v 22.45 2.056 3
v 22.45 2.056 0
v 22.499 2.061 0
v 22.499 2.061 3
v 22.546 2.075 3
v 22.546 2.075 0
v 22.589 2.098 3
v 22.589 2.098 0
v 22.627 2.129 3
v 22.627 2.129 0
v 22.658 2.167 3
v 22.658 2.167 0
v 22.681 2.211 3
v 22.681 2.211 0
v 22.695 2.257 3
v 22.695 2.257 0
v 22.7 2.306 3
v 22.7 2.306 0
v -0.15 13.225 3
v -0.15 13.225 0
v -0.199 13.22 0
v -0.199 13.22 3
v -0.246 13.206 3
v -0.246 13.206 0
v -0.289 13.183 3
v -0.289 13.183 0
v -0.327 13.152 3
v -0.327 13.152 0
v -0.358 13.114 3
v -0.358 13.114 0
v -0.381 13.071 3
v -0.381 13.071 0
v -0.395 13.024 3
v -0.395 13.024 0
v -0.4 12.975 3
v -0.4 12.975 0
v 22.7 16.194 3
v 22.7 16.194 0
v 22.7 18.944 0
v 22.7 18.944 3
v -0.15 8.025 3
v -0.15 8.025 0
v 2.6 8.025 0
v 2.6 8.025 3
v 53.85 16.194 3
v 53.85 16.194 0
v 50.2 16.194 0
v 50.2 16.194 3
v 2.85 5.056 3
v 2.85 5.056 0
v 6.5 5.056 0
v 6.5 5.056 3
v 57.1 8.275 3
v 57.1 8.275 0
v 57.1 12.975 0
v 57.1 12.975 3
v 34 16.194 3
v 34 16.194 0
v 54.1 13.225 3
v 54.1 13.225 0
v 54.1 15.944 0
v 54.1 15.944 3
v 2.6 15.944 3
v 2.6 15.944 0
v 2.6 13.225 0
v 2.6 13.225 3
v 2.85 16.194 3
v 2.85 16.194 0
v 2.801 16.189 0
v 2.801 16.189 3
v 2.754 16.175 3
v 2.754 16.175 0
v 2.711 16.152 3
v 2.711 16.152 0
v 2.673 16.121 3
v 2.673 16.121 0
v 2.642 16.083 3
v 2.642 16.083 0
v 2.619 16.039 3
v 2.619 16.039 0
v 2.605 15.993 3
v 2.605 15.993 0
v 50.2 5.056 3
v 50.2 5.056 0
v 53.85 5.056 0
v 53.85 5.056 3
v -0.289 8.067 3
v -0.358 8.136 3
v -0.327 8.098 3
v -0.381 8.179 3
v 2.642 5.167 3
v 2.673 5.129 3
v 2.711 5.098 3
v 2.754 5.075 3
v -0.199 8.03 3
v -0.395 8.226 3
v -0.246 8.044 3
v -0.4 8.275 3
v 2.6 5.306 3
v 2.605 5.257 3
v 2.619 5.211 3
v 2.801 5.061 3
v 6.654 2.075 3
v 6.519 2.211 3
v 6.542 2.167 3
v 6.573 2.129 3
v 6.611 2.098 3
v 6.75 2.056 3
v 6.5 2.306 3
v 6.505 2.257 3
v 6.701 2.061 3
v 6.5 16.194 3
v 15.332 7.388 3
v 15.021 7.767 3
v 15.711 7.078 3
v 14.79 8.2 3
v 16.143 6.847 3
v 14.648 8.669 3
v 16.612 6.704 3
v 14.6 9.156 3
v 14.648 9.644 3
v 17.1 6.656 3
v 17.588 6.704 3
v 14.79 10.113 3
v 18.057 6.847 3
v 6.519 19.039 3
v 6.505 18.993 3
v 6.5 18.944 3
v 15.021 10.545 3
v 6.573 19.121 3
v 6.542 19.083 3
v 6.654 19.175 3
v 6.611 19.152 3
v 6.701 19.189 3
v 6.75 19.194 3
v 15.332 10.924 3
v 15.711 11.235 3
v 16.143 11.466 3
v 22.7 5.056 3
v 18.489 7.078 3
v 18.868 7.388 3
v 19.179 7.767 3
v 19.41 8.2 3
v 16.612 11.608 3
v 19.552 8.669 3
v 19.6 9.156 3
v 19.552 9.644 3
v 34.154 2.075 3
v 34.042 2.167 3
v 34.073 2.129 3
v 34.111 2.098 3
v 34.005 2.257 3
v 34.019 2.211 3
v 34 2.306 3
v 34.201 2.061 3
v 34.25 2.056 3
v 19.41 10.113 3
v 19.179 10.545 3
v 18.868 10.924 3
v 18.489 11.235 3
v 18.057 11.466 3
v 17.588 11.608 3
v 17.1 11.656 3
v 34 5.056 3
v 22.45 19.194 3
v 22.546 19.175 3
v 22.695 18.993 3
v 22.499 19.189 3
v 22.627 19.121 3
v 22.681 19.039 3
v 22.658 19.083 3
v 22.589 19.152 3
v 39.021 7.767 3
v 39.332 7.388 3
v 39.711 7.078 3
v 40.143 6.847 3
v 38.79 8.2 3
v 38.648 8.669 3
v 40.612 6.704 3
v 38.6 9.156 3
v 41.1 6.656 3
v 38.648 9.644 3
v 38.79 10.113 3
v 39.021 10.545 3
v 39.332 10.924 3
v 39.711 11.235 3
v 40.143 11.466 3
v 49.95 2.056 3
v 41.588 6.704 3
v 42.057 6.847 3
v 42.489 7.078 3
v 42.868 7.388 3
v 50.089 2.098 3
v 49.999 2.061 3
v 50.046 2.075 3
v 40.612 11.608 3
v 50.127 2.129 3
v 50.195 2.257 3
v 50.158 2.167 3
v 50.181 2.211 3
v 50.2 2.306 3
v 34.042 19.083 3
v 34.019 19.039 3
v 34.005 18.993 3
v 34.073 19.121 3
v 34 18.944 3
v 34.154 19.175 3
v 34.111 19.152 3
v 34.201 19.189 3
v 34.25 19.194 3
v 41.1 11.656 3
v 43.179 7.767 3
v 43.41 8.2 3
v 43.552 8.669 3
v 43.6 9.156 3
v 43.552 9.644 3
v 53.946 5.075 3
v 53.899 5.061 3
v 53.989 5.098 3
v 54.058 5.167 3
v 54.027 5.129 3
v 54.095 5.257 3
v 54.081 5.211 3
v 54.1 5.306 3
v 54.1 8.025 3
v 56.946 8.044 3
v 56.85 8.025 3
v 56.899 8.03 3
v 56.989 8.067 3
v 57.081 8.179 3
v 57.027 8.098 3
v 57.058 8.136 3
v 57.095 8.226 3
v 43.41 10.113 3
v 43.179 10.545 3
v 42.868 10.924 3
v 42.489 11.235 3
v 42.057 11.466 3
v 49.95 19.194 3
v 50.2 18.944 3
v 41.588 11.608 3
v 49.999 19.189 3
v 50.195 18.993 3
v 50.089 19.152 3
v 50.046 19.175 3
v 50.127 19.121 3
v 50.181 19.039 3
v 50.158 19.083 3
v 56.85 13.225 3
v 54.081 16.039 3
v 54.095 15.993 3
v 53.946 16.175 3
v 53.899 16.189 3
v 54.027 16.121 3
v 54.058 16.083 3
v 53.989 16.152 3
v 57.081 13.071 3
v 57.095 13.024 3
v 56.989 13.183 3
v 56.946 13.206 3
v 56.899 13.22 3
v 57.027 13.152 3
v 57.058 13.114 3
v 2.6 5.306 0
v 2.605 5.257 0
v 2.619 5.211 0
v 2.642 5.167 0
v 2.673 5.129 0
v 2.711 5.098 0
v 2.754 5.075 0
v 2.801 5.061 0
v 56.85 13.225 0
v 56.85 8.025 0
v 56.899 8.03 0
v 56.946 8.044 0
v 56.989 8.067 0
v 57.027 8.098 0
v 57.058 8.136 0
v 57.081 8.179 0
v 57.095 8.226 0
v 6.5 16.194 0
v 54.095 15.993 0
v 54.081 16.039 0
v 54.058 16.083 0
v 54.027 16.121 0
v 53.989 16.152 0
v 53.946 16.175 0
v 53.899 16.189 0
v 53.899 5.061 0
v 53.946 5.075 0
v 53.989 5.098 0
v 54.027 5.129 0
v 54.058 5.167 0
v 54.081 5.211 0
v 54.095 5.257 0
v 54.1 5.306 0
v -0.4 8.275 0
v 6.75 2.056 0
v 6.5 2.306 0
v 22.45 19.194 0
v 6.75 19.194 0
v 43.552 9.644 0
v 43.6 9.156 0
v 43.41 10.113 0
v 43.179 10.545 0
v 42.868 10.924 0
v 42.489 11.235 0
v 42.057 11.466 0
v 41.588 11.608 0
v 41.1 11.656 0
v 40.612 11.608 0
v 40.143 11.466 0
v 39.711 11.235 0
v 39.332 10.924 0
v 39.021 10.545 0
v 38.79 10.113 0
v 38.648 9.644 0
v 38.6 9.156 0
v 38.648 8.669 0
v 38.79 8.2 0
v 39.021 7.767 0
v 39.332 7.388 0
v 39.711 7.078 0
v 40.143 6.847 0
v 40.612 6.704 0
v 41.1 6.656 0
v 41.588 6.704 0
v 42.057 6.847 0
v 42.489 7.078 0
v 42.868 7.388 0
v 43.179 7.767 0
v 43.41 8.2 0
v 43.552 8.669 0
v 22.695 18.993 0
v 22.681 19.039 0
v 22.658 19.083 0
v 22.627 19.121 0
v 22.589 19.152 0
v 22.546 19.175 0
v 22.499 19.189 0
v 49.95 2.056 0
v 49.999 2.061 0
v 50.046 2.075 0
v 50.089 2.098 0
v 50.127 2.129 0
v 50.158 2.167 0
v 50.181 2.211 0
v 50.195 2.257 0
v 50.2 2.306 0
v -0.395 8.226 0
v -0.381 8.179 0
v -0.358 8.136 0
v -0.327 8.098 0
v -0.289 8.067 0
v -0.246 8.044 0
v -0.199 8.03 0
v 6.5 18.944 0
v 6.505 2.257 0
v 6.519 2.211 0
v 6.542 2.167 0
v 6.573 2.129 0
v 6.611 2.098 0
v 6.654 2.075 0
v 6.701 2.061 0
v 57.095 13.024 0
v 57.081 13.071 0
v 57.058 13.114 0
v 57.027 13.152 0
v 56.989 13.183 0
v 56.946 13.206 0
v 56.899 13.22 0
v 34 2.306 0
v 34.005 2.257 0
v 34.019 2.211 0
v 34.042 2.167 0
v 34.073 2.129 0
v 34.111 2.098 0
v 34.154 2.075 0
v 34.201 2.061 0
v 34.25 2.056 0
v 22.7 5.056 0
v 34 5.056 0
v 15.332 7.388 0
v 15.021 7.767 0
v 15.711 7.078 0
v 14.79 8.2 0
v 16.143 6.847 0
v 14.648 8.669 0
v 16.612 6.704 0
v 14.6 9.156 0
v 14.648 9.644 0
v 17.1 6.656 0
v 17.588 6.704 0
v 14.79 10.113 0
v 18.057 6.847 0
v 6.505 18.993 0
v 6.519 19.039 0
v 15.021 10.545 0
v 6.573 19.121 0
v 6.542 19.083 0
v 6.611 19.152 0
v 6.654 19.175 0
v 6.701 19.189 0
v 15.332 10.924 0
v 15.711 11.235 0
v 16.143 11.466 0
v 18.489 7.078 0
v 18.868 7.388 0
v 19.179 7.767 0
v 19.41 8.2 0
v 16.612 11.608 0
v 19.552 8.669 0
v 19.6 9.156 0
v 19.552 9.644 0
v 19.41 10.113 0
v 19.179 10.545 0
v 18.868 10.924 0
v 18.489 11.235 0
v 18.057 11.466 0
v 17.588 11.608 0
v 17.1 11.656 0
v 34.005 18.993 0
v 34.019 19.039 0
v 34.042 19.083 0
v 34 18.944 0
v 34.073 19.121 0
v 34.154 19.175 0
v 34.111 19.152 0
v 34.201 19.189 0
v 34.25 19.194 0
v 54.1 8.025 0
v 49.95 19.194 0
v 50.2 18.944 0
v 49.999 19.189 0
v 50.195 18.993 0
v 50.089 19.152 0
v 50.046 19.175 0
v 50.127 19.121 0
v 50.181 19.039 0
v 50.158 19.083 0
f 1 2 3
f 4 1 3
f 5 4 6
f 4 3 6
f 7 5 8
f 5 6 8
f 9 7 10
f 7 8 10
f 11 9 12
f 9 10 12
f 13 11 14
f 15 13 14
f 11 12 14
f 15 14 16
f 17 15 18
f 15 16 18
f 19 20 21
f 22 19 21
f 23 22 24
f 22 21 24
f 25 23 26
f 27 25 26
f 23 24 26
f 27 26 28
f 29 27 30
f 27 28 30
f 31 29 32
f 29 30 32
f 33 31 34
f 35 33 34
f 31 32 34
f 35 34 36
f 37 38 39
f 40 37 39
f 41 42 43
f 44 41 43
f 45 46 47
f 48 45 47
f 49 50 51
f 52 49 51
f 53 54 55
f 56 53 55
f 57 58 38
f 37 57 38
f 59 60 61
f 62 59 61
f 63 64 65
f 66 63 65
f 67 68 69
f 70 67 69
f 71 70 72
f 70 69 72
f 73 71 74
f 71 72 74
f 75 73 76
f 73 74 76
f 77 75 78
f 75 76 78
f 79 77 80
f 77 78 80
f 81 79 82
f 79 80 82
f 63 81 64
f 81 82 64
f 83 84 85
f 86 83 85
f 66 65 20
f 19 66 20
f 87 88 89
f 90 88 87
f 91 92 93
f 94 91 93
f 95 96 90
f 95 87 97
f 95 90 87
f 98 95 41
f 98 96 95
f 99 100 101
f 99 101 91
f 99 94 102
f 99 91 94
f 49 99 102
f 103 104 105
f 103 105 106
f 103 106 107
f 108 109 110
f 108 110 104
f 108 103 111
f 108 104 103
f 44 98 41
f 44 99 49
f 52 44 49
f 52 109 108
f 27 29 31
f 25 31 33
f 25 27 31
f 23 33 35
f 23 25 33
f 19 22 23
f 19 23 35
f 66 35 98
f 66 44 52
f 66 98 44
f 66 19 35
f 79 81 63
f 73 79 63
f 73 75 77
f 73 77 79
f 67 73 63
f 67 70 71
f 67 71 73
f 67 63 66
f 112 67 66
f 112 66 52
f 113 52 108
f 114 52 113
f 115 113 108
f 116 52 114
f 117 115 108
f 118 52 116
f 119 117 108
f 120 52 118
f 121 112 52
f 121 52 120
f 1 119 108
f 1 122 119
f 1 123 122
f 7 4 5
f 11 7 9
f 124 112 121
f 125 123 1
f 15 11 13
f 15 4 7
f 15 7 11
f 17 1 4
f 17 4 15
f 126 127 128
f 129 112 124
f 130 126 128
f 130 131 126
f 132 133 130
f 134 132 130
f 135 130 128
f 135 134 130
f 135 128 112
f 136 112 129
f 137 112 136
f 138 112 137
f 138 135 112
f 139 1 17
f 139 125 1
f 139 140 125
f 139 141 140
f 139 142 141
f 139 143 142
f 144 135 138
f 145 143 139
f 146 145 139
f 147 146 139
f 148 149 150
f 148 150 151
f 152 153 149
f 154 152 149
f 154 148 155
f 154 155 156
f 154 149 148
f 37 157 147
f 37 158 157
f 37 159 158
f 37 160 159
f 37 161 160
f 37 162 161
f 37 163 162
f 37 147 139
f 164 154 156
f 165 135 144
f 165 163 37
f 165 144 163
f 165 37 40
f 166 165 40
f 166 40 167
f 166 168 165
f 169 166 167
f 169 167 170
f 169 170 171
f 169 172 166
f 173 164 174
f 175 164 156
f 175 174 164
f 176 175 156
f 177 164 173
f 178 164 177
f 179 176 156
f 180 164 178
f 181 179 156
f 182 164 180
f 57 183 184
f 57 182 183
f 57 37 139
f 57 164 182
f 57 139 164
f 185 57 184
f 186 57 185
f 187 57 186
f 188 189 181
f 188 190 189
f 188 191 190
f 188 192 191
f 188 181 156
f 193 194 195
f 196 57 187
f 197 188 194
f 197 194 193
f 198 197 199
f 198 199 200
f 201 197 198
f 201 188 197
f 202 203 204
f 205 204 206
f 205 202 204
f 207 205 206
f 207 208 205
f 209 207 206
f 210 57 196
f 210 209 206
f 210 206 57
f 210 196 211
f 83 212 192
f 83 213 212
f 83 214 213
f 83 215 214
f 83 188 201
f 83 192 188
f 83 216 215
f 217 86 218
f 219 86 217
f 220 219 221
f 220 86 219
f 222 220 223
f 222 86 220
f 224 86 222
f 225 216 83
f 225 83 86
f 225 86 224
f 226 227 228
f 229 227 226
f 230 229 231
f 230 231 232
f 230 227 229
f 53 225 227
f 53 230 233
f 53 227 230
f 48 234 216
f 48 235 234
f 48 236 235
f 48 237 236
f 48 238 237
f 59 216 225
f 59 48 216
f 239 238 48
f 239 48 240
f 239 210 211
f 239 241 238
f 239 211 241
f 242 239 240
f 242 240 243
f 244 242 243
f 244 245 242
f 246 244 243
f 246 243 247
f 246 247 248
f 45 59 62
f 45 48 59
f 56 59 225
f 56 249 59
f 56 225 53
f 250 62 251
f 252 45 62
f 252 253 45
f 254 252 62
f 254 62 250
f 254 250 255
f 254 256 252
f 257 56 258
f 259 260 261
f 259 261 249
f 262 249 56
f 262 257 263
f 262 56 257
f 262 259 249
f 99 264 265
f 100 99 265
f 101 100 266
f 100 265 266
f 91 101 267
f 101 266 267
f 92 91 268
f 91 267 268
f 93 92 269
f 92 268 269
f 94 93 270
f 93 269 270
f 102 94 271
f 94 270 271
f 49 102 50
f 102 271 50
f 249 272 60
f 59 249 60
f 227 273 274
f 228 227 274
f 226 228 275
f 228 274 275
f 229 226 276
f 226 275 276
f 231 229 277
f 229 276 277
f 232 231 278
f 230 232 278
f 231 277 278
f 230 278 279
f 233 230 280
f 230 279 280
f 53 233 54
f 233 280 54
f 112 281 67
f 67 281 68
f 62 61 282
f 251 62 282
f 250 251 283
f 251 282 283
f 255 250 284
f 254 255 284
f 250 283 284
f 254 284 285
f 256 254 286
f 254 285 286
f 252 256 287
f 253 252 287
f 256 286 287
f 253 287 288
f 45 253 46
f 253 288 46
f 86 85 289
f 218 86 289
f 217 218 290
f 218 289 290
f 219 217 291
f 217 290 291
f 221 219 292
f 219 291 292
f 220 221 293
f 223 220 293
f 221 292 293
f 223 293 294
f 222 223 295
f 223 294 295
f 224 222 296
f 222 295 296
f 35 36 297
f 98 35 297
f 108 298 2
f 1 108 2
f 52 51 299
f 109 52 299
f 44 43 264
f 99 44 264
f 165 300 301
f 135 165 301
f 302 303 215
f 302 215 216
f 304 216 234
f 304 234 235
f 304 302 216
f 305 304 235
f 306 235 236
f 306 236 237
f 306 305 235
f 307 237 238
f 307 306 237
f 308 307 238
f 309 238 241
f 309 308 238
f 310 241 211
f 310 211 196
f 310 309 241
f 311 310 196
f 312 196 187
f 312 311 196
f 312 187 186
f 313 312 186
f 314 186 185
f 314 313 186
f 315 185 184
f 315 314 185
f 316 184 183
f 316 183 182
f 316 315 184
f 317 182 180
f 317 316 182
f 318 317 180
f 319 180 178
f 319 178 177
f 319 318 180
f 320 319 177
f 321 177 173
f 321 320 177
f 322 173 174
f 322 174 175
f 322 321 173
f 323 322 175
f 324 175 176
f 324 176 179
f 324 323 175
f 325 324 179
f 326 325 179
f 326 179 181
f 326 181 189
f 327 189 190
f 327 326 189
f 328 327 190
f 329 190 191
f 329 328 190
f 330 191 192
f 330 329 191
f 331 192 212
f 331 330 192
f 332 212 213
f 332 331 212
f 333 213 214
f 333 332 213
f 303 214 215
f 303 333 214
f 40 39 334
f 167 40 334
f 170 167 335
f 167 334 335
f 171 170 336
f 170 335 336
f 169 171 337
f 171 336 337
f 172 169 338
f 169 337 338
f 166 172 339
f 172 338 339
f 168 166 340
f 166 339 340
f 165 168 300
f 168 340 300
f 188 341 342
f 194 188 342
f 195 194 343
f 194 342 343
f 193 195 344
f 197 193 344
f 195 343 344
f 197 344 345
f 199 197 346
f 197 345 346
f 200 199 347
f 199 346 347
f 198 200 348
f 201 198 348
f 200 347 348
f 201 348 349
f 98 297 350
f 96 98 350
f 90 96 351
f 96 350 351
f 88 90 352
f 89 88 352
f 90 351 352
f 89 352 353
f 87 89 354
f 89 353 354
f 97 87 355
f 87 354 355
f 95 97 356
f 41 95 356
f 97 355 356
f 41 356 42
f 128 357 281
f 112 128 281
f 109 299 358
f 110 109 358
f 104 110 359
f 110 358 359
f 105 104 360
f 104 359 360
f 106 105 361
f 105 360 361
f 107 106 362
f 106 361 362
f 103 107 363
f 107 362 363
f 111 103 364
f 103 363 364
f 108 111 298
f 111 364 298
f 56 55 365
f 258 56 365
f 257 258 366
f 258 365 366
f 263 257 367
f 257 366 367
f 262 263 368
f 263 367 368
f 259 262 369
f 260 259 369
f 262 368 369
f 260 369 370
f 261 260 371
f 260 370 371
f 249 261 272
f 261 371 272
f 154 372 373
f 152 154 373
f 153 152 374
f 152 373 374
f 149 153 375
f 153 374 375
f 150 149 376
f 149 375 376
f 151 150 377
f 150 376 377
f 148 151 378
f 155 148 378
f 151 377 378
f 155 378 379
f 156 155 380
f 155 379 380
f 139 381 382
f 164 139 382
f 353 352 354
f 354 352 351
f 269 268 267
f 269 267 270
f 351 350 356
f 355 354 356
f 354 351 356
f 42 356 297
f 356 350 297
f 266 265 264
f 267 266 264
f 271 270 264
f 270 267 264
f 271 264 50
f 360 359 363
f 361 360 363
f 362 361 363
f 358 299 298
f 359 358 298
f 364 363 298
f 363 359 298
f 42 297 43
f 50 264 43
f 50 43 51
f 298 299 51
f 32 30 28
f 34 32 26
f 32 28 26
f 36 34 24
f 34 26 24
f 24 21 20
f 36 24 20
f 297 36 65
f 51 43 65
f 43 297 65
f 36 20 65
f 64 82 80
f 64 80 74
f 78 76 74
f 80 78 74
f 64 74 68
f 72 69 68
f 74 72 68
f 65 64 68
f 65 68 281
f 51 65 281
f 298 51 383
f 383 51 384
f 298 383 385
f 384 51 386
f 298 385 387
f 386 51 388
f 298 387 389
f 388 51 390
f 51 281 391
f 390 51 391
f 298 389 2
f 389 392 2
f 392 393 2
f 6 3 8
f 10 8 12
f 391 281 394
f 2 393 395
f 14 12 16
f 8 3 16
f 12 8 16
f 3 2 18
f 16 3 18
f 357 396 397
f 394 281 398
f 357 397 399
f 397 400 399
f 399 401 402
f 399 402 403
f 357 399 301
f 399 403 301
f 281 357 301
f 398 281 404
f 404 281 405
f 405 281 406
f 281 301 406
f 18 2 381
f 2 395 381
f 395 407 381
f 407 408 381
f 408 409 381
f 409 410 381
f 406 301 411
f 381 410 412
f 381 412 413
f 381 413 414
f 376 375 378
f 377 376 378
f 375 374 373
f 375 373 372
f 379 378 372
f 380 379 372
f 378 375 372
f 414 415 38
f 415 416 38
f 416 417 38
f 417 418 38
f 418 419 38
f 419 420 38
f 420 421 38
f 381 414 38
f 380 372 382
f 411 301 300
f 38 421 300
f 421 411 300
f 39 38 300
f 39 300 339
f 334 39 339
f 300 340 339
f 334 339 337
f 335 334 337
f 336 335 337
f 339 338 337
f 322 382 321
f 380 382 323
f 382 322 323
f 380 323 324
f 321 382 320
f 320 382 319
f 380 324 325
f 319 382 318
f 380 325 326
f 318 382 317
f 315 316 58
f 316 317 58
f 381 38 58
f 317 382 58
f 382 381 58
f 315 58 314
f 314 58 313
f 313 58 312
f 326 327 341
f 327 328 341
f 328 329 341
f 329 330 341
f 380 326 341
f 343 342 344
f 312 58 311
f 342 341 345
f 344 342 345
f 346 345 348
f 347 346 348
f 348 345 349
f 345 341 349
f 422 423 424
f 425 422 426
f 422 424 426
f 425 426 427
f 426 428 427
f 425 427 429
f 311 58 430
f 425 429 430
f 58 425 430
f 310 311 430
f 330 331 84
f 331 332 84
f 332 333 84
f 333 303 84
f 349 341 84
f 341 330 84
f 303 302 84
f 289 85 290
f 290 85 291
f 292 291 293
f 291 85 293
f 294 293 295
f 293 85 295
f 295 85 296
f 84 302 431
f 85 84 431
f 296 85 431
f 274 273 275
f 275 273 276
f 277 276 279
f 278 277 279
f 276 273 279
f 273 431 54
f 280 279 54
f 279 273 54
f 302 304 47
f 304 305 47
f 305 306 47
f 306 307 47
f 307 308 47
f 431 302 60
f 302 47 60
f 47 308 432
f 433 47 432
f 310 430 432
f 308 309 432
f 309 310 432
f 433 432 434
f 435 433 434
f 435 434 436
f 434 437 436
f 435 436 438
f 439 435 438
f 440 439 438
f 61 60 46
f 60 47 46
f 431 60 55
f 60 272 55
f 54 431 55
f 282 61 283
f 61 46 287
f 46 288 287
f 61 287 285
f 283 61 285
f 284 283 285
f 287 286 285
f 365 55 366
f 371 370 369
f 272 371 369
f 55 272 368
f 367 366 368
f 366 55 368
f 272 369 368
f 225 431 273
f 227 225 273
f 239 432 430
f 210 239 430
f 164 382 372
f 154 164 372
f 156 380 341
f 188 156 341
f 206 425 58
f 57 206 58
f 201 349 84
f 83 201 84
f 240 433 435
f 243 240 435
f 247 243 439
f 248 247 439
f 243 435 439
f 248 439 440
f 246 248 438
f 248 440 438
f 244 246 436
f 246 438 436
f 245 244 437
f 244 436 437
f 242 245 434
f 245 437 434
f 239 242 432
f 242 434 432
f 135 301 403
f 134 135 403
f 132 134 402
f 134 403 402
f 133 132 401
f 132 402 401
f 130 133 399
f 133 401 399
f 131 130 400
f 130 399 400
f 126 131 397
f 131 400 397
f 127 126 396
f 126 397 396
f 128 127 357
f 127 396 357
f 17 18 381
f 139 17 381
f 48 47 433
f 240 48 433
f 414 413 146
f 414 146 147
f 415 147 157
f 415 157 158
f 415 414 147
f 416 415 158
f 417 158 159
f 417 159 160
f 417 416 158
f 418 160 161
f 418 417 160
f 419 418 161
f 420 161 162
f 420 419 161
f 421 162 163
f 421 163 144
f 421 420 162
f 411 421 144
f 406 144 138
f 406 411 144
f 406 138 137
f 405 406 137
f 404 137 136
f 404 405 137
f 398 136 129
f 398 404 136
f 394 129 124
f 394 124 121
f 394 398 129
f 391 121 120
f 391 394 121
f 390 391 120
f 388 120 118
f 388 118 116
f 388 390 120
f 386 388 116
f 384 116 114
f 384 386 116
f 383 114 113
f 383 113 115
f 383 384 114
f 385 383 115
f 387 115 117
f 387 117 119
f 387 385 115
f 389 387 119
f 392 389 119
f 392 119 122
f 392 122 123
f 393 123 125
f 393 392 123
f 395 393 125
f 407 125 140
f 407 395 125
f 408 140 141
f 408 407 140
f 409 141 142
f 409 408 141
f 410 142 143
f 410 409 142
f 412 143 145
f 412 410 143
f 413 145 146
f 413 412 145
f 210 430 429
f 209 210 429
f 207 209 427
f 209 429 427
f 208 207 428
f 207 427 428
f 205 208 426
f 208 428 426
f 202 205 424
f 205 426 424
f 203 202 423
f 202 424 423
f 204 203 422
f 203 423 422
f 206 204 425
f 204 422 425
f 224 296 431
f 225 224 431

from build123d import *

# Parameters (mm, degrees)
SKETCH2_R           = 2.5
BOSS_EXTRUDE1_DEPTH = 3


with BuildPart() as part:
    # Sketch2 → Boss-Extrude1 (new body)
    with BuildSketch(Plane.XY):
        with BuildLine():
            Line((34.25, 2.05625), (49.95, 2.05625))
            ThreePointArc((49.95, 2.05625), (50.126776695, 2.129473305), (50.2, 2.30625))
            Line((50.2, 2.30625), (50.2, 5.05625))
            Line((50.2, 5.05625), (53.85, 5.05625))
            ThreePointArc((53.85, 5.05625), (54.026776695, 5.129473305), (54.1, 5.30625))
            Line((54.1, 5.30625), (54.1, 8.025))
            Line((54.1, 8.025), (56.85, 8.025))
            ThreePointArc((56.85, 8.025), (57.026776695, 8.098223305), (57.1, 8.275))
            Line((57.1, 8.275), (57.1, 12.975))
            ThreePointArc((57.1, 12.975), (57.026776695, 13.151776695), (56.85, 13.225))
            Line((56.85, 13.225), (54.1, 13.225))
            Line((54.1, 13.225), (54.1, 15.94375))
            ThreePointArc((54.1, 15.94375), (54.026776695, 16.120526695), (53.85, 16.19375))
            Line((53.85, 16.19375), (50.2, 16.19375))
            Line((50.2, 16.19375), (50.2, 18.94375))
            ThreePointArc((50.2, 18.94375), (50.126776695, 19.120526695), (49.95, 19.19375))
            Line((49.95, 19.19375), (34.25, 19.19375))
            ThreePointArc((34.25, 19.19375), (34.073223305, 19.120526695), (34, 18.94375))
            Line((34, 18.94375), (34, 16.19375))
            Line((34, 16.19375), (22.7, 16.19375))
            Line((22.7, 16.19375), (22.7, 18.94375))
            ThreePointArc((22.7, 18.94375), (22.626776695, 19.120526695), (22.45, 19.19375))
            Line((22.45, 19.19375), (6.75, 19.19375))
            ThreePointArc((6.75, 19.19375), (6.573223305, 19.120526695), (6.5, 18.94375))
            Line((6.5, 18.94375), (6.5, 16.19375))
            Line((6.5, 16.19375), (2.85, 16.19375))
            ThreePointArc((2.85, 16.19375), (2.673223305, 16.120526695), (2.6, 15.94375))
            Line((2.6, 15.94375), (2.6, 13.225))
            Line((2.6, 13.225), (-0.15, 13.225))
            ThreePointArc((-0.15, 13.225), (-0.326776695, 13.151776695), (-0.4, 12.975))
            Line((-0.4, 12.975), (-0.4, 8.275))
            ThreePointArc((-0.4, 8.275), (-0.326776695, 8.098223305), (-0.15, 8.025))
            Line((-0.15, 8.025), (2.6, 8.025))
            Line((2.6, 8.025), (2.6, 5.30625))
            ThreePointArc((2.6, 5.30625), (2.673223305, 5.129473305), (2.85, 5.05625))
            Line((2.85, 5.05625), (6.5, 5.05625))
            Line((6.5, 5.05625), (6.5, 2.30625))
            ThreePointArc((6.5, 2.30625), (6.573223305, 2.129473305), (6.75, 2.05625))
            Line((6.75, 2.05625), (22.45, 2.05625))
            ThreePointArc((22.45, 2.05625), (22.626776695, 2.129473305), (22.7, 2.30625))
            Line((22.7, 2.30625), (22.7, 5.05625))
            Line((22.7, 5.05625), (34, 5.05625))
            Line((34, 5.05625), (34, 2.30625))
            ThreePointArc((34, 2.30625), (34.073223305, 2.129473305), (34.25, 2.05625))
        make_face()
        with Locations((17.1, 9.15625)):
            Circle(SKETCH2_R, mode=Mode.SUBTRACT)
        with Locations((41.1, 9.15625)):
            Circle(SKETCH2_R, mode=Mode.SUBTRACT)
    extrude(amount=BOSS_EXTRUDE1_DEPTH)


solid = part.part
